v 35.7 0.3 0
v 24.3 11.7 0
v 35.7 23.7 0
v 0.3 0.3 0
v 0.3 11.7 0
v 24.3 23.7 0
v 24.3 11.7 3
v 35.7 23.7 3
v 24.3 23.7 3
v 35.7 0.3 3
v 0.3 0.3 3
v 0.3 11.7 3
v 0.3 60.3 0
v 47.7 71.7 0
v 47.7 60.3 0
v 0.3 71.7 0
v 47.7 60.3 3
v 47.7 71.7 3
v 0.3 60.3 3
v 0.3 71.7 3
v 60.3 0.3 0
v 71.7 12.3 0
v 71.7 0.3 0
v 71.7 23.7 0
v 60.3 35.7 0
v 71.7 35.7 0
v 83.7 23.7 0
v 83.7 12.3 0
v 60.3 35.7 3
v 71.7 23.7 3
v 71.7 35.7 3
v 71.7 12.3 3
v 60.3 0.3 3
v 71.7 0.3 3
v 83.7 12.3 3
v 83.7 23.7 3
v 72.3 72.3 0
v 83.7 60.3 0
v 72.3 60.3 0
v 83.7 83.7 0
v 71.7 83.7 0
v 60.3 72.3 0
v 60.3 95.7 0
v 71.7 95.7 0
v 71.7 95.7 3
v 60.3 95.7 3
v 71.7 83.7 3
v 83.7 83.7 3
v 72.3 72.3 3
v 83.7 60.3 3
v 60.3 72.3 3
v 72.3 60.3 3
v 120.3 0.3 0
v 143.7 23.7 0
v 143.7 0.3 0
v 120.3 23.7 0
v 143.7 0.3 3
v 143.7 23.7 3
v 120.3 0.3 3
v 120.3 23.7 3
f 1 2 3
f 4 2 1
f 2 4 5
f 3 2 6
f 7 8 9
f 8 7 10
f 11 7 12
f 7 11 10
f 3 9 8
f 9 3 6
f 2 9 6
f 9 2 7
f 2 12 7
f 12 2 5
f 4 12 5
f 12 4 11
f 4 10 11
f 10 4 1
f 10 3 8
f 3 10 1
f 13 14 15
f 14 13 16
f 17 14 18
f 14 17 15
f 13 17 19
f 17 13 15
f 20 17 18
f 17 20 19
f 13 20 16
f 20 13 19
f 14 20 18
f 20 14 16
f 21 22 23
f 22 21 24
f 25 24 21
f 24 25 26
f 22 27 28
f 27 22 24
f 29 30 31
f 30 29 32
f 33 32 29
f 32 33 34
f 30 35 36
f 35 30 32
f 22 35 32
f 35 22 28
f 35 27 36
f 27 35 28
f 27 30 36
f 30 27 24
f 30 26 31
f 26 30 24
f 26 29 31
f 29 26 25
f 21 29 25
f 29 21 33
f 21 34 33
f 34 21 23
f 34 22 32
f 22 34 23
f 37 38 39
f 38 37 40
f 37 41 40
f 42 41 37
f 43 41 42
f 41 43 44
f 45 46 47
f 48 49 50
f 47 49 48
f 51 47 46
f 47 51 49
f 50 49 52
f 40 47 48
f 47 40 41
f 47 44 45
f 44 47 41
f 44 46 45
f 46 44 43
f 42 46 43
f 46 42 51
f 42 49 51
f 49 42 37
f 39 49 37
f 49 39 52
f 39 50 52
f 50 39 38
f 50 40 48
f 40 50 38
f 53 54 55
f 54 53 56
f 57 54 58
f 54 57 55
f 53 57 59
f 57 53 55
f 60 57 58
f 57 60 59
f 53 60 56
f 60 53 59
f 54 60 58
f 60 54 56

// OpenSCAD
x = 12;
h = 3;
slack = 0.3;

lits = [
    [
    [1, 0, 0, 0],
    [1, 0, 0, 0],
    [1, 1, 0, 0],
    [0, 0, 0, 0]
    ],
    [
    [1, 0, 0, 0],
    [1, 0, 0, 0],
    [1, 0, 0, 0],
    [1, 0, 0, 0]
    ],
    [
    [1, 1, 1, 0],
    [0, 1, 0, 0],
    [0, 0, 0, 0],
    [0, 0, 0, 0]
    ],
    [
    [0, 1, 1, 0],
    [1, 1, 0, 0],
    [0, 0, 0, 0],
    [0, 0, 0, 0]
    ],
    [
    [1, 1, 0, 0],
    [1, 1, 0, 0],
    [0, 0, 0, 0],
    [0, 0, 0, 0]
    ]
    
];

for (n = [0 : len(lits)-1]) {
    tetromino = lits[n];
    translate([5*x*floor(n/2), 5*x*(n%2), 0])
    linear_extrude(height=h)
    offset(delta=-slack)
    for (i = [0 : len(tetromino)-1]) {
        row = tetromino[i];
        for (j = [0 : len(row)-1]) {
            if (row[j] == 1) {
                translate([i*x, j*x, 0])
                square(x);
            }
        }
    }
}
